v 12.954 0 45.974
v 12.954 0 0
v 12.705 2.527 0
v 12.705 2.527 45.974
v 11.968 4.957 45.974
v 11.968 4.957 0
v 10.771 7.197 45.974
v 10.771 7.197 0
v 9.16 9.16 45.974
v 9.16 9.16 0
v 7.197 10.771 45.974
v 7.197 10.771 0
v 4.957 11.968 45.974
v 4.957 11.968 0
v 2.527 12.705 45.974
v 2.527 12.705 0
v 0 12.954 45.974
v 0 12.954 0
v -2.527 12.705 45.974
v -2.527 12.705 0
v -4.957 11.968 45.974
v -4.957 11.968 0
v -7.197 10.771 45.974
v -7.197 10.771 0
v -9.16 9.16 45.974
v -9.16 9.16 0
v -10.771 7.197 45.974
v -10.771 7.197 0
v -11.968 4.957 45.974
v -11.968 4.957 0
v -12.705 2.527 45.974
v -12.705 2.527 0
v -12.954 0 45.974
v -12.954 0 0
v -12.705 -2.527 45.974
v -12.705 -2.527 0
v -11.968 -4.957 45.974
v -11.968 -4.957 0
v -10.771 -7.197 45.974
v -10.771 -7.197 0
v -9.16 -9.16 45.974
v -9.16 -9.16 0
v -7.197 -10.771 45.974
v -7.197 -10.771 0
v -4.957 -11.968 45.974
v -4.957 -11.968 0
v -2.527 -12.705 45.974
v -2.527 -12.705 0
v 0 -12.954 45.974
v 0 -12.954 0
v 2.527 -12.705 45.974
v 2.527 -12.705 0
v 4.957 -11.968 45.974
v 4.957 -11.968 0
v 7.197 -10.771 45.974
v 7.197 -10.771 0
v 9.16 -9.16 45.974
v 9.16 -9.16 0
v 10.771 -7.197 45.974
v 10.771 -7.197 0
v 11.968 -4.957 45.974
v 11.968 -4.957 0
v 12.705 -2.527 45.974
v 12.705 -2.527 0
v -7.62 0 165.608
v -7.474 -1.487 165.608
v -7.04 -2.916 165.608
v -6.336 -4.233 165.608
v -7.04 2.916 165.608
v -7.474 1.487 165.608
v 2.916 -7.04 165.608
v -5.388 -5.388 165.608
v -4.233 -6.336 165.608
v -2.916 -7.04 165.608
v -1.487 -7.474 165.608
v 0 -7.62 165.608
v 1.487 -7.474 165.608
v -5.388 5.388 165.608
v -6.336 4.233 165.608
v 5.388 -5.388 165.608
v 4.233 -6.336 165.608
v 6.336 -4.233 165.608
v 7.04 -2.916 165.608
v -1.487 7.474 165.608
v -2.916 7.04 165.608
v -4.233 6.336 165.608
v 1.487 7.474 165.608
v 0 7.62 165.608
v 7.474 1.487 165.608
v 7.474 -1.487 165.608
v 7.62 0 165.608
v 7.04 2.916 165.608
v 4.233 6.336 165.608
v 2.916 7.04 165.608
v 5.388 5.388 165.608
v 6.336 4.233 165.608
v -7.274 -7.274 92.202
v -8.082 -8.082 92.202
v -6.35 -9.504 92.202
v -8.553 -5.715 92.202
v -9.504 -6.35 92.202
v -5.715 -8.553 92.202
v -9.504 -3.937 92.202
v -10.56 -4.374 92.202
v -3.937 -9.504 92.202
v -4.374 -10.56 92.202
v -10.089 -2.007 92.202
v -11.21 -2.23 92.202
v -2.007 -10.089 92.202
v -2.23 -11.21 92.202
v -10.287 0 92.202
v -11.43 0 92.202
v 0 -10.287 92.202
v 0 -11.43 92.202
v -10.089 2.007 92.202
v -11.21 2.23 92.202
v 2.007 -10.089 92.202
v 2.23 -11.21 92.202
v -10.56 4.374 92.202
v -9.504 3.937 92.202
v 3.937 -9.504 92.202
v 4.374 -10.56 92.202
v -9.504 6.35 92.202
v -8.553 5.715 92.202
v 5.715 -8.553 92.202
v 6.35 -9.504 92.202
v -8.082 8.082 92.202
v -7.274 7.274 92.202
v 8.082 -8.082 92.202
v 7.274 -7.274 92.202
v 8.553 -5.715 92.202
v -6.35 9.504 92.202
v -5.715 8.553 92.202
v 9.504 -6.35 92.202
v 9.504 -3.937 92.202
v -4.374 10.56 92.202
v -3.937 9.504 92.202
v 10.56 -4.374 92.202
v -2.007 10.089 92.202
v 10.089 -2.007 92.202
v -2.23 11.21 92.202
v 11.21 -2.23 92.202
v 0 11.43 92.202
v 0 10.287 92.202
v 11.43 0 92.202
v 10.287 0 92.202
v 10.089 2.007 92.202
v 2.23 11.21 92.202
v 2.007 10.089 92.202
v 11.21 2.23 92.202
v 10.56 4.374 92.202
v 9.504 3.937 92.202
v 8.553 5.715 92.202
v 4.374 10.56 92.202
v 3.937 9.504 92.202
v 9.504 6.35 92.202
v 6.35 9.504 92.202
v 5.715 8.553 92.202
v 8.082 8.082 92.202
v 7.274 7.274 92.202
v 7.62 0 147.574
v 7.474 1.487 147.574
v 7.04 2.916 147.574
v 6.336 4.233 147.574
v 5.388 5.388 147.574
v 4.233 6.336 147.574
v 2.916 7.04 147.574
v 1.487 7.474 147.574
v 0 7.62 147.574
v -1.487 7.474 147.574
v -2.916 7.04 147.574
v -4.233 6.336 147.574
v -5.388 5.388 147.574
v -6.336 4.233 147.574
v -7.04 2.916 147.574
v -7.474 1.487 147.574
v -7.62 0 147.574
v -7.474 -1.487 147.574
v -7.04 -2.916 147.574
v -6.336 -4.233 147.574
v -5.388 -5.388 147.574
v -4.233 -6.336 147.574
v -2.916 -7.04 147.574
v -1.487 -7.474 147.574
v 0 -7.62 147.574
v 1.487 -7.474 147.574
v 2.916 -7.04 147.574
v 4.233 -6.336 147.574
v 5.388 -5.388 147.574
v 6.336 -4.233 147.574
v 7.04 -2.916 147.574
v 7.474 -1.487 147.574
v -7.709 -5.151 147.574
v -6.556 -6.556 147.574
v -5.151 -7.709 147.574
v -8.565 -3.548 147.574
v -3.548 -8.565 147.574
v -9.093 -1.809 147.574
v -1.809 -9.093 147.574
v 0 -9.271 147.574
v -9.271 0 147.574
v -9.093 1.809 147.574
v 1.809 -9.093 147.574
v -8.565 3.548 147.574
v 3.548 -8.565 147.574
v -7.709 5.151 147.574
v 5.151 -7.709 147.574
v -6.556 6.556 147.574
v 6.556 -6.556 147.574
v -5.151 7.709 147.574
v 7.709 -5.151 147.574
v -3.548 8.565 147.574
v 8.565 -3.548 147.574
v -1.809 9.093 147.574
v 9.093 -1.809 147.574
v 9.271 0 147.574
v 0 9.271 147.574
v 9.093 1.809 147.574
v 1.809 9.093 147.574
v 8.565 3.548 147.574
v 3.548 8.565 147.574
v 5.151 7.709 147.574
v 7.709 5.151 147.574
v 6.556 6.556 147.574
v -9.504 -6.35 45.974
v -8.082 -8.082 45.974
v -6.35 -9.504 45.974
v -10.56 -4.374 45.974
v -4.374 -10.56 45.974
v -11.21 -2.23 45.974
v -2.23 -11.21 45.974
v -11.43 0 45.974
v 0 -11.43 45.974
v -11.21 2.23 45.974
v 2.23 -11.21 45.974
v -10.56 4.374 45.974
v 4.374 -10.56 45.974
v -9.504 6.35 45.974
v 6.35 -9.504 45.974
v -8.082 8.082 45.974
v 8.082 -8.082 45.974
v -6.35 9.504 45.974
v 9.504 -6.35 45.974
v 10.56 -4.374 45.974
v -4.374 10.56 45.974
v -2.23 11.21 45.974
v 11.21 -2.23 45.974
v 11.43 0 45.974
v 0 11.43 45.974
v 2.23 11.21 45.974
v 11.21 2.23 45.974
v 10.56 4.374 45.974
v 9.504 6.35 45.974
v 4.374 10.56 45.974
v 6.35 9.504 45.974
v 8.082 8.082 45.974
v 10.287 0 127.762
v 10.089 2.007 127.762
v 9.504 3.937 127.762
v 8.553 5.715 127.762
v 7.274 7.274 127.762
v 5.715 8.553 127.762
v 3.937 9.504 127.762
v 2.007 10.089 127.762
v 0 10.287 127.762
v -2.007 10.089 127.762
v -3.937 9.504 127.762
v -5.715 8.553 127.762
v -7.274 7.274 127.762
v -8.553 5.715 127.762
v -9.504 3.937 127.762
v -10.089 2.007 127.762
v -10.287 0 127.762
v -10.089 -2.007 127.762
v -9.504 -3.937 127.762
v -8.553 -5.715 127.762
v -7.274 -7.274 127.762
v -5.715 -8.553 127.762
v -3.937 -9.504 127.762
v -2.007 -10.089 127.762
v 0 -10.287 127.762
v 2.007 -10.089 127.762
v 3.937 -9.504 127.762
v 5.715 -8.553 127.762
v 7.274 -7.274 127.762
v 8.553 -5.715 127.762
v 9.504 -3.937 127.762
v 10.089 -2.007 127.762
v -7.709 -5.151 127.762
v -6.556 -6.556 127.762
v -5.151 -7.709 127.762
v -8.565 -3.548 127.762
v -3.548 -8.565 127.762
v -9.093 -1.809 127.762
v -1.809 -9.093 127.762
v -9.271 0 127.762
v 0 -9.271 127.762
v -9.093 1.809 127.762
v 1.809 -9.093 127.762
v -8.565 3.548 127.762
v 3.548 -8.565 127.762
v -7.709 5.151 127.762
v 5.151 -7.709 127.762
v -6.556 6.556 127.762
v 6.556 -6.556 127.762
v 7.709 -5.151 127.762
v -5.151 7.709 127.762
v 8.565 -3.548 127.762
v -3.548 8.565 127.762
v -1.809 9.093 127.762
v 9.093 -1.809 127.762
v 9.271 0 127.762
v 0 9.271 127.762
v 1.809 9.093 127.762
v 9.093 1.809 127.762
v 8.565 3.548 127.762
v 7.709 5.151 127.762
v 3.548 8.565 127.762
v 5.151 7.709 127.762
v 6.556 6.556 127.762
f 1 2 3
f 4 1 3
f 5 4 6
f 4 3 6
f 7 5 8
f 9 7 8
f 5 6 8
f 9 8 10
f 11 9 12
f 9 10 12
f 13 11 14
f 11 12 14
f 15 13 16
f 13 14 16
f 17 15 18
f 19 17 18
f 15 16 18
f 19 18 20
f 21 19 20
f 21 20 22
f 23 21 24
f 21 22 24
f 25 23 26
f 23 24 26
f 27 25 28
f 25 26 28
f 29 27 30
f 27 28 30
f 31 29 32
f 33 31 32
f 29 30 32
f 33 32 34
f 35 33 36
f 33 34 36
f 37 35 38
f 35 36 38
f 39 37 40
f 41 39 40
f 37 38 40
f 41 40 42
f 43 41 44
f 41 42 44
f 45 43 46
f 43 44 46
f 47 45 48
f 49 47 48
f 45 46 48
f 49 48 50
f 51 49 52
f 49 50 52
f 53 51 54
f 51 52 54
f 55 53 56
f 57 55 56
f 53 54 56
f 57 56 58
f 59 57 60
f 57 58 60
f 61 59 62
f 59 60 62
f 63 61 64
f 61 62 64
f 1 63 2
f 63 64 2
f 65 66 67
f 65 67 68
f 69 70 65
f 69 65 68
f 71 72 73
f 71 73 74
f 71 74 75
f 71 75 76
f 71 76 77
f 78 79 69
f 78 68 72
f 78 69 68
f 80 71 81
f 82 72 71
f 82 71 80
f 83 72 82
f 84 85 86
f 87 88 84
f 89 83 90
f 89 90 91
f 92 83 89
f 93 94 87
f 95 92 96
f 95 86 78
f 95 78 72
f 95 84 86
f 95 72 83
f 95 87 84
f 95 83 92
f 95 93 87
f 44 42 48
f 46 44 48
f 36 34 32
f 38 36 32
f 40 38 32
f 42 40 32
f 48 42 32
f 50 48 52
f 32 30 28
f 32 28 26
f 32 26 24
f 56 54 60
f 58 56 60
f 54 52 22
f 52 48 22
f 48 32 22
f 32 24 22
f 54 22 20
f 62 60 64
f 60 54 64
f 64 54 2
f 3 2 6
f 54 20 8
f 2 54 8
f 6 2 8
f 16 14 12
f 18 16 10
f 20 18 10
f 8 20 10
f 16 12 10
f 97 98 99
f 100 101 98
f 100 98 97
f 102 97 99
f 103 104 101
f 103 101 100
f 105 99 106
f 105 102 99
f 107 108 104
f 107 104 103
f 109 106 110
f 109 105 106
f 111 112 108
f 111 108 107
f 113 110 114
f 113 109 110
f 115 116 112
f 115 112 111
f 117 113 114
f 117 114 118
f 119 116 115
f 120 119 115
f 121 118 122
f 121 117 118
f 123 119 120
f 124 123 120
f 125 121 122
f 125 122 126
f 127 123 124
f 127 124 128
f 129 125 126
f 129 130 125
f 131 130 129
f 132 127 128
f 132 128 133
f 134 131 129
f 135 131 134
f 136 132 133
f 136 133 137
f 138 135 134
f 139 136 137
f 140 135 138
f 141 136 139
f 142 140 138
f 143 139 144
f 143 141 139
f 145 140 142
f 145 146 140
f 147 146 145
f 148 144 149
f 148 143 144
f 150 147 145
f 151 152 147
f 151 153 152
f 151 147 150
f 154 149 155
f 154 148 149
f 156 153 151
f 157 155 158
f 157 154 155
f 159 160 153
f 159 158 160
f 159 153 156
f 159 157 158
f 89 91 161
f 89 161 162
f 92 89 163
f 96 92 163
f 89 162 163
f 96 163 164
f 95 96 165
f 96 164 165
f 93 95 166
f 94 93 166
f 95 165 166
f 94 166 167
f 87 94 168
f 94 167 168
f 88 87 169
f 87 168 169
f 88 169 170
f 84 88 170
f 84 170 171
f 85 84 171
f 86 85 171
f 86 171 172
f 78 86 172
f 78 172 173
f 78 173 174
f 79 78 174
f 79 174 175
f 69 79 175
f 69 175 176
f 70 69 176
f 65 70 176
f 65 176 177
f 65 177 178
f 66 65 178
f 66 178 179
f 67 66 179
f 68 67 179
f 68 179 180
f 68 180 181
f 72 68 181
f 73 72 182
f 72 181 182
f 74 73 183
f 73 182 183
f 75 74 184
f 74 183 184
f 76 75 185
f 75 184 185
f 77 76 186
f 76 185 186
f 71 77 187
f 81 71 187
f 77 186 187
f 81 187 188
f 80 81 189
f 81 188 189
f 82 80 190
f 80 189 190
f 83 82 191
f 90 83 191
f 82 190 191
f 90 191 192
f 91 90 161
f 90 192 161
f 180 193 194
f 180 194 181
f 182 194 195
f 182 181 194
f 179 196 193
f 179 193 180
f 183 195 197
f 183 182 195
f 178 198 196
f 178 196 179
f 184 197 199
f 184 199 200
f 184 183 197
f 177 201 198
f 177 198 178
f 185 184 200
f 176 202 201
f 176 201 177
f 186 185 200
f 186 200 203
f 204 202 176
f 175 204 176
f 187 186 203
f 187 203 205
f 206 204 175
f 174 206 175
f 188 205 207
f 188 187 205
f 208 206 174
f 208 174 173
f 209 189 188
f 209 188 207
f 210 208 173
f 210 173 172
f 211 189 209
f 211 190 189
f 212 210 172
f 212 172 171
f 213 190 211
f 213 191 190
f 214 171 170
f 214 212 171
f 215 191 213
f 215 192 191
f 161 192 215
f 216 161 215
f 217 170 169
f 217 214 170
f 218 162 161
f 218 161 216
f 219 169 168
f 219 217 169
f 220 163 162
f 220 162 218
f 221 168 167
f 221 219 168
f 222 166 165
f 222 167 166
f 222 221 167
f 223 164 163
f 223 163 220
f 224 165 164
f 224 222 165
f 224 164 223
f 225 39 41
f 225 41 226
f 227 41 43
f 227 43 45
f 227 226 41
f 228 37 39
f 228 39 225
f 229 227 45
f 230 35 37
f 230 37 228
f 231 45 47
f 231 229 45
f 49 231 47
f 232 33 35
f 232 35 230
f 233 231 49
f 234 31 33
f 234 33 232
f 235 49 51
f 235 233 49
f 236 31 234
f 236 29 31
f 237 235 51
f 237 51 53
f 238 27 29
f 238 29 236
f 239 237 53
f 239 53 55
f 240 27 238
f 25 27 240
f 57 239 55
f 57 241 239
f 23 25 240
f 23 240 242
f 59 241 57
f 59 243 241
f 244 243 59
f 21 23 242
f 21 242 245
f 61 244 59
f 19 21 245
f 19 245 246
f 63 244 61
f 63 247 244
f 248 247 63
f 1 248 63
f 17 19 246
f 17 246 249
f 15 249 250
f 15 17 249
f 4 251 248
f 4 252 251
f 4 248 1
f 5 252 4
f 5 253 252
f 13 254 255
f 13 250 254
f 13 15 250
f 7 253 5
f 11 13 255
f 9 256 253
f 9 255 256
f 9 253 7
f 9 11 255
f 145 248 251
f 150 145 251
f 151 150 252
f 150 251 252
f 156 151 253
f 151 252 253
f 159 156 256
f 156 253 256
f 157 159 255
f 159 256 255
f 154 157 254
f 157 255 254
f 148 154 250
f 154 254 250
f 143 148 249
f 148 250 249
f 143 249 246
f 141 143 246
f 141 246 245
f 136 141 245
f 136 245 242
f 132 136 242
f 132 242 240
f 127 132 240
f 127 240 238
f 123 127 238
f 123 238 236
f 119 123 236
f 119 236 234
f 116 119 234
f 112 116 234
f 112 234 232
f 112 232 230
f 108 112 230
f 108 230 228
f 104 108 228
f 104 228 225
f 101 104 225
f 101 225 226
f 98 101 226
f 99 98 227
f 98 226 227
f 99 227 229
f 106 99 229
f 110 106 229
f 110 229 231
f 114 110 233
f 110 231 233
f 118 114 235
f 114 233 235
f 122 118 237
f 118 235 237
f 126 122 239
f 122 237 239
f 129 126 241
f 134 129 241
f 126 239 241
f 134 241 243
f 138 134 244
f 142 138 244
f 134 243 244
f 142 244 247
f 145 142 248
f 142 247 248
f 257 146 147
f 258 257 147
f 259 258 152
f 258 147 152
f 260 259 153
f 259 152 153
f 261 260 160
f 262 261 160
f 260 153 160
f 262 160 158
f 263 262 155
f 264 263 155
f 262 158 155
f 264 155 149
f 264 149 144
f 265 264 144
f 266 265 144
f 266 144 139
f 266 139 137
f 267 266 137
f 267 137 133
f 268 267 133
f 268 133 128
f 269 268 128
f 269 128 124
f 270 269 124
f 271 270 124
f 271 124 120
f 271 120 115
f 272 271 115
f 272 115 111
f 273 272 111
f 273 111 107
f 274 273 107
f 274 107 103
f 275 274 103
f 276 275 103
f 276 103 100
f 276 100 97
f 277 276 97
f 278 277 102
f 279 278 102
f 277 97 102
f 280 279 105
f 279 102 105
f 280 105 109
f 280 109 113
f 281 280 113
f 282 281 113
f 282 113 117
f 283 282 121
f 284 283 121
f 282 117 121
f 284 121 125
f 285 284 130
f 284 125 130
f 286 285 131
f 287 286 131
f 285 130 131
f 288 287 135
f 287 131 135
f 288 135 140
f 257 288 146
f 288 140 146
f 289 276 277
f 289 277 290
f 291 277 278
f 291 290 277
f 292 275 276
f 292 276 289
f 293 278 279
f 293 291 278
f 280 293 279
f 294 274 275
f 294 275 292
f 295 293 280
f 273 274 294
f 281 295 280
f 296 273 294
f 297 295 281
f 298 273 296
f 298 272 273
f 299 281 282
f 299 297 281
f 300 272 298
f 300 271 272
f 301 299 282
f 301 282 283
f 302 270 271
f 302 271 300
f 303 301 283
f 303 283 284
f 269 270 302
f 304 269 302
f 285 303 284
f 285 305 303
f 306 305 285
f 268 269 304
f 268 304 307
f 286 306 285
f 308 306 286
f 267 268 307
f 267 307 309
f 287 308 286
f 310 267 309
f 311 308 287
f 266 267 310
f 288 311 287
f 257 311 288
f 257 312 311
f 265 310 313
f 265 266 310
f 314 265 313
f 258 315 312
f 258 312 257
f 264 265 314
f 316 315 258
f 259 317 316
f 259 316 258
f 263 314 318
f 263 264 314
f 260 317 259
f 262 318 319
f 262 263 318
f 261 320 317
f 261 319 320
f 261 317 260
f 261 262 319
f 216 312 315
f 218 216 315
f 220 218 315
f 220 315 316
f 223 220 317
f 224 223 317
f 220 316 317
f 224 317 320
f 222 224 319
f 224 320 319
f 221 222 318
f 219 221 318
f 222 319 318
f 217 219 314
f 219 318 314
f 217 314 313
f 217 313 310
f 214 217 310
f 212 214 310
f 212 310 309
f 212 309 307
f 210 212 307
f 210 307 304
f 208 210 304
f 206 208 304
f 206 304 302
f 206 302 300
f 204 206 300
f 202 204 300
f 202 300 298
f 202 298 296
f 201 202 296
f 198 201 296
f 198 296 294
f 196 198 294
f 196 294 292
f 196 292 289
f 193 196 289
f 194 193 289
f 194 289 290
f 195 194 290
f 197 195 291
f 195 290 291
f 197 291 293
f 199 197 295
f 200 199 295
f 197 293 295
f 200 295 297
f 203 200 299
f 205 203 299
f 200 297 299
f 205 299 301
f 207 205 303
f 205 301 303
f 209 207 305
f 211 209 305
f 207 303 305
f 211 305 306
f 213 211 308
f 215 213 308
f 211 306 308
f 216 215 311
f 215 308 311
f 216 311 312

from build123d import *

# Parameters (mm, degrees)
F0_R     = 12.954
F0_R_2   = 11.43
F1_DEPTH = 45.974
F0_R_3   = 10.287
F2_DEPTH = 92.202
F0_R_4   = 9.271
F3_DEPTH = 127.762
F0_R_5   = 7.62
F4_DEPTH = 147.574
F5_DEPTH = 165.608


with BuildPart() as f1:
    # F0 (on Top) → F1 (new body)
    with BuildSketch(Plane.XY):
        Circle(F0_R)
        Circle(F0_R_2, mode=Mode.SUBTRACT)
    extrude(amount=F1_DEPTH)

    # F0 (on Top) → F2 (join)
    with BuildSketch(Plane.XY):
        Circle(F0_R_2)
        Circle(F0_R_3, mode=Mode.SUBTRACT)
    extrude(amount=F2_DEPTH)

    # F0 (on Top) → F3 (join)
    with BuildSketch(Plane.XY):
        Circle(F0_R_3)
        Circle(F0_R_4, mode=Mode.SUBTRACT)
    extrude(amount=F3_DEPTH)

    # F0 (on Top) → F4 (join)
    with BuildSketch(Plane.XY):
        Circle(F0_R_4)
        Circle(F0_R_5, mode=Mode.SUBTRACT)
    extrude(amount=F4_DEPTH)

    # F0 (on Top) → F5 (join)
    with BuildSketch(Plane.XY):
        Circle(F0_R_5)
    extrude(amount=F5_DEPTH)


solid = f1.part
